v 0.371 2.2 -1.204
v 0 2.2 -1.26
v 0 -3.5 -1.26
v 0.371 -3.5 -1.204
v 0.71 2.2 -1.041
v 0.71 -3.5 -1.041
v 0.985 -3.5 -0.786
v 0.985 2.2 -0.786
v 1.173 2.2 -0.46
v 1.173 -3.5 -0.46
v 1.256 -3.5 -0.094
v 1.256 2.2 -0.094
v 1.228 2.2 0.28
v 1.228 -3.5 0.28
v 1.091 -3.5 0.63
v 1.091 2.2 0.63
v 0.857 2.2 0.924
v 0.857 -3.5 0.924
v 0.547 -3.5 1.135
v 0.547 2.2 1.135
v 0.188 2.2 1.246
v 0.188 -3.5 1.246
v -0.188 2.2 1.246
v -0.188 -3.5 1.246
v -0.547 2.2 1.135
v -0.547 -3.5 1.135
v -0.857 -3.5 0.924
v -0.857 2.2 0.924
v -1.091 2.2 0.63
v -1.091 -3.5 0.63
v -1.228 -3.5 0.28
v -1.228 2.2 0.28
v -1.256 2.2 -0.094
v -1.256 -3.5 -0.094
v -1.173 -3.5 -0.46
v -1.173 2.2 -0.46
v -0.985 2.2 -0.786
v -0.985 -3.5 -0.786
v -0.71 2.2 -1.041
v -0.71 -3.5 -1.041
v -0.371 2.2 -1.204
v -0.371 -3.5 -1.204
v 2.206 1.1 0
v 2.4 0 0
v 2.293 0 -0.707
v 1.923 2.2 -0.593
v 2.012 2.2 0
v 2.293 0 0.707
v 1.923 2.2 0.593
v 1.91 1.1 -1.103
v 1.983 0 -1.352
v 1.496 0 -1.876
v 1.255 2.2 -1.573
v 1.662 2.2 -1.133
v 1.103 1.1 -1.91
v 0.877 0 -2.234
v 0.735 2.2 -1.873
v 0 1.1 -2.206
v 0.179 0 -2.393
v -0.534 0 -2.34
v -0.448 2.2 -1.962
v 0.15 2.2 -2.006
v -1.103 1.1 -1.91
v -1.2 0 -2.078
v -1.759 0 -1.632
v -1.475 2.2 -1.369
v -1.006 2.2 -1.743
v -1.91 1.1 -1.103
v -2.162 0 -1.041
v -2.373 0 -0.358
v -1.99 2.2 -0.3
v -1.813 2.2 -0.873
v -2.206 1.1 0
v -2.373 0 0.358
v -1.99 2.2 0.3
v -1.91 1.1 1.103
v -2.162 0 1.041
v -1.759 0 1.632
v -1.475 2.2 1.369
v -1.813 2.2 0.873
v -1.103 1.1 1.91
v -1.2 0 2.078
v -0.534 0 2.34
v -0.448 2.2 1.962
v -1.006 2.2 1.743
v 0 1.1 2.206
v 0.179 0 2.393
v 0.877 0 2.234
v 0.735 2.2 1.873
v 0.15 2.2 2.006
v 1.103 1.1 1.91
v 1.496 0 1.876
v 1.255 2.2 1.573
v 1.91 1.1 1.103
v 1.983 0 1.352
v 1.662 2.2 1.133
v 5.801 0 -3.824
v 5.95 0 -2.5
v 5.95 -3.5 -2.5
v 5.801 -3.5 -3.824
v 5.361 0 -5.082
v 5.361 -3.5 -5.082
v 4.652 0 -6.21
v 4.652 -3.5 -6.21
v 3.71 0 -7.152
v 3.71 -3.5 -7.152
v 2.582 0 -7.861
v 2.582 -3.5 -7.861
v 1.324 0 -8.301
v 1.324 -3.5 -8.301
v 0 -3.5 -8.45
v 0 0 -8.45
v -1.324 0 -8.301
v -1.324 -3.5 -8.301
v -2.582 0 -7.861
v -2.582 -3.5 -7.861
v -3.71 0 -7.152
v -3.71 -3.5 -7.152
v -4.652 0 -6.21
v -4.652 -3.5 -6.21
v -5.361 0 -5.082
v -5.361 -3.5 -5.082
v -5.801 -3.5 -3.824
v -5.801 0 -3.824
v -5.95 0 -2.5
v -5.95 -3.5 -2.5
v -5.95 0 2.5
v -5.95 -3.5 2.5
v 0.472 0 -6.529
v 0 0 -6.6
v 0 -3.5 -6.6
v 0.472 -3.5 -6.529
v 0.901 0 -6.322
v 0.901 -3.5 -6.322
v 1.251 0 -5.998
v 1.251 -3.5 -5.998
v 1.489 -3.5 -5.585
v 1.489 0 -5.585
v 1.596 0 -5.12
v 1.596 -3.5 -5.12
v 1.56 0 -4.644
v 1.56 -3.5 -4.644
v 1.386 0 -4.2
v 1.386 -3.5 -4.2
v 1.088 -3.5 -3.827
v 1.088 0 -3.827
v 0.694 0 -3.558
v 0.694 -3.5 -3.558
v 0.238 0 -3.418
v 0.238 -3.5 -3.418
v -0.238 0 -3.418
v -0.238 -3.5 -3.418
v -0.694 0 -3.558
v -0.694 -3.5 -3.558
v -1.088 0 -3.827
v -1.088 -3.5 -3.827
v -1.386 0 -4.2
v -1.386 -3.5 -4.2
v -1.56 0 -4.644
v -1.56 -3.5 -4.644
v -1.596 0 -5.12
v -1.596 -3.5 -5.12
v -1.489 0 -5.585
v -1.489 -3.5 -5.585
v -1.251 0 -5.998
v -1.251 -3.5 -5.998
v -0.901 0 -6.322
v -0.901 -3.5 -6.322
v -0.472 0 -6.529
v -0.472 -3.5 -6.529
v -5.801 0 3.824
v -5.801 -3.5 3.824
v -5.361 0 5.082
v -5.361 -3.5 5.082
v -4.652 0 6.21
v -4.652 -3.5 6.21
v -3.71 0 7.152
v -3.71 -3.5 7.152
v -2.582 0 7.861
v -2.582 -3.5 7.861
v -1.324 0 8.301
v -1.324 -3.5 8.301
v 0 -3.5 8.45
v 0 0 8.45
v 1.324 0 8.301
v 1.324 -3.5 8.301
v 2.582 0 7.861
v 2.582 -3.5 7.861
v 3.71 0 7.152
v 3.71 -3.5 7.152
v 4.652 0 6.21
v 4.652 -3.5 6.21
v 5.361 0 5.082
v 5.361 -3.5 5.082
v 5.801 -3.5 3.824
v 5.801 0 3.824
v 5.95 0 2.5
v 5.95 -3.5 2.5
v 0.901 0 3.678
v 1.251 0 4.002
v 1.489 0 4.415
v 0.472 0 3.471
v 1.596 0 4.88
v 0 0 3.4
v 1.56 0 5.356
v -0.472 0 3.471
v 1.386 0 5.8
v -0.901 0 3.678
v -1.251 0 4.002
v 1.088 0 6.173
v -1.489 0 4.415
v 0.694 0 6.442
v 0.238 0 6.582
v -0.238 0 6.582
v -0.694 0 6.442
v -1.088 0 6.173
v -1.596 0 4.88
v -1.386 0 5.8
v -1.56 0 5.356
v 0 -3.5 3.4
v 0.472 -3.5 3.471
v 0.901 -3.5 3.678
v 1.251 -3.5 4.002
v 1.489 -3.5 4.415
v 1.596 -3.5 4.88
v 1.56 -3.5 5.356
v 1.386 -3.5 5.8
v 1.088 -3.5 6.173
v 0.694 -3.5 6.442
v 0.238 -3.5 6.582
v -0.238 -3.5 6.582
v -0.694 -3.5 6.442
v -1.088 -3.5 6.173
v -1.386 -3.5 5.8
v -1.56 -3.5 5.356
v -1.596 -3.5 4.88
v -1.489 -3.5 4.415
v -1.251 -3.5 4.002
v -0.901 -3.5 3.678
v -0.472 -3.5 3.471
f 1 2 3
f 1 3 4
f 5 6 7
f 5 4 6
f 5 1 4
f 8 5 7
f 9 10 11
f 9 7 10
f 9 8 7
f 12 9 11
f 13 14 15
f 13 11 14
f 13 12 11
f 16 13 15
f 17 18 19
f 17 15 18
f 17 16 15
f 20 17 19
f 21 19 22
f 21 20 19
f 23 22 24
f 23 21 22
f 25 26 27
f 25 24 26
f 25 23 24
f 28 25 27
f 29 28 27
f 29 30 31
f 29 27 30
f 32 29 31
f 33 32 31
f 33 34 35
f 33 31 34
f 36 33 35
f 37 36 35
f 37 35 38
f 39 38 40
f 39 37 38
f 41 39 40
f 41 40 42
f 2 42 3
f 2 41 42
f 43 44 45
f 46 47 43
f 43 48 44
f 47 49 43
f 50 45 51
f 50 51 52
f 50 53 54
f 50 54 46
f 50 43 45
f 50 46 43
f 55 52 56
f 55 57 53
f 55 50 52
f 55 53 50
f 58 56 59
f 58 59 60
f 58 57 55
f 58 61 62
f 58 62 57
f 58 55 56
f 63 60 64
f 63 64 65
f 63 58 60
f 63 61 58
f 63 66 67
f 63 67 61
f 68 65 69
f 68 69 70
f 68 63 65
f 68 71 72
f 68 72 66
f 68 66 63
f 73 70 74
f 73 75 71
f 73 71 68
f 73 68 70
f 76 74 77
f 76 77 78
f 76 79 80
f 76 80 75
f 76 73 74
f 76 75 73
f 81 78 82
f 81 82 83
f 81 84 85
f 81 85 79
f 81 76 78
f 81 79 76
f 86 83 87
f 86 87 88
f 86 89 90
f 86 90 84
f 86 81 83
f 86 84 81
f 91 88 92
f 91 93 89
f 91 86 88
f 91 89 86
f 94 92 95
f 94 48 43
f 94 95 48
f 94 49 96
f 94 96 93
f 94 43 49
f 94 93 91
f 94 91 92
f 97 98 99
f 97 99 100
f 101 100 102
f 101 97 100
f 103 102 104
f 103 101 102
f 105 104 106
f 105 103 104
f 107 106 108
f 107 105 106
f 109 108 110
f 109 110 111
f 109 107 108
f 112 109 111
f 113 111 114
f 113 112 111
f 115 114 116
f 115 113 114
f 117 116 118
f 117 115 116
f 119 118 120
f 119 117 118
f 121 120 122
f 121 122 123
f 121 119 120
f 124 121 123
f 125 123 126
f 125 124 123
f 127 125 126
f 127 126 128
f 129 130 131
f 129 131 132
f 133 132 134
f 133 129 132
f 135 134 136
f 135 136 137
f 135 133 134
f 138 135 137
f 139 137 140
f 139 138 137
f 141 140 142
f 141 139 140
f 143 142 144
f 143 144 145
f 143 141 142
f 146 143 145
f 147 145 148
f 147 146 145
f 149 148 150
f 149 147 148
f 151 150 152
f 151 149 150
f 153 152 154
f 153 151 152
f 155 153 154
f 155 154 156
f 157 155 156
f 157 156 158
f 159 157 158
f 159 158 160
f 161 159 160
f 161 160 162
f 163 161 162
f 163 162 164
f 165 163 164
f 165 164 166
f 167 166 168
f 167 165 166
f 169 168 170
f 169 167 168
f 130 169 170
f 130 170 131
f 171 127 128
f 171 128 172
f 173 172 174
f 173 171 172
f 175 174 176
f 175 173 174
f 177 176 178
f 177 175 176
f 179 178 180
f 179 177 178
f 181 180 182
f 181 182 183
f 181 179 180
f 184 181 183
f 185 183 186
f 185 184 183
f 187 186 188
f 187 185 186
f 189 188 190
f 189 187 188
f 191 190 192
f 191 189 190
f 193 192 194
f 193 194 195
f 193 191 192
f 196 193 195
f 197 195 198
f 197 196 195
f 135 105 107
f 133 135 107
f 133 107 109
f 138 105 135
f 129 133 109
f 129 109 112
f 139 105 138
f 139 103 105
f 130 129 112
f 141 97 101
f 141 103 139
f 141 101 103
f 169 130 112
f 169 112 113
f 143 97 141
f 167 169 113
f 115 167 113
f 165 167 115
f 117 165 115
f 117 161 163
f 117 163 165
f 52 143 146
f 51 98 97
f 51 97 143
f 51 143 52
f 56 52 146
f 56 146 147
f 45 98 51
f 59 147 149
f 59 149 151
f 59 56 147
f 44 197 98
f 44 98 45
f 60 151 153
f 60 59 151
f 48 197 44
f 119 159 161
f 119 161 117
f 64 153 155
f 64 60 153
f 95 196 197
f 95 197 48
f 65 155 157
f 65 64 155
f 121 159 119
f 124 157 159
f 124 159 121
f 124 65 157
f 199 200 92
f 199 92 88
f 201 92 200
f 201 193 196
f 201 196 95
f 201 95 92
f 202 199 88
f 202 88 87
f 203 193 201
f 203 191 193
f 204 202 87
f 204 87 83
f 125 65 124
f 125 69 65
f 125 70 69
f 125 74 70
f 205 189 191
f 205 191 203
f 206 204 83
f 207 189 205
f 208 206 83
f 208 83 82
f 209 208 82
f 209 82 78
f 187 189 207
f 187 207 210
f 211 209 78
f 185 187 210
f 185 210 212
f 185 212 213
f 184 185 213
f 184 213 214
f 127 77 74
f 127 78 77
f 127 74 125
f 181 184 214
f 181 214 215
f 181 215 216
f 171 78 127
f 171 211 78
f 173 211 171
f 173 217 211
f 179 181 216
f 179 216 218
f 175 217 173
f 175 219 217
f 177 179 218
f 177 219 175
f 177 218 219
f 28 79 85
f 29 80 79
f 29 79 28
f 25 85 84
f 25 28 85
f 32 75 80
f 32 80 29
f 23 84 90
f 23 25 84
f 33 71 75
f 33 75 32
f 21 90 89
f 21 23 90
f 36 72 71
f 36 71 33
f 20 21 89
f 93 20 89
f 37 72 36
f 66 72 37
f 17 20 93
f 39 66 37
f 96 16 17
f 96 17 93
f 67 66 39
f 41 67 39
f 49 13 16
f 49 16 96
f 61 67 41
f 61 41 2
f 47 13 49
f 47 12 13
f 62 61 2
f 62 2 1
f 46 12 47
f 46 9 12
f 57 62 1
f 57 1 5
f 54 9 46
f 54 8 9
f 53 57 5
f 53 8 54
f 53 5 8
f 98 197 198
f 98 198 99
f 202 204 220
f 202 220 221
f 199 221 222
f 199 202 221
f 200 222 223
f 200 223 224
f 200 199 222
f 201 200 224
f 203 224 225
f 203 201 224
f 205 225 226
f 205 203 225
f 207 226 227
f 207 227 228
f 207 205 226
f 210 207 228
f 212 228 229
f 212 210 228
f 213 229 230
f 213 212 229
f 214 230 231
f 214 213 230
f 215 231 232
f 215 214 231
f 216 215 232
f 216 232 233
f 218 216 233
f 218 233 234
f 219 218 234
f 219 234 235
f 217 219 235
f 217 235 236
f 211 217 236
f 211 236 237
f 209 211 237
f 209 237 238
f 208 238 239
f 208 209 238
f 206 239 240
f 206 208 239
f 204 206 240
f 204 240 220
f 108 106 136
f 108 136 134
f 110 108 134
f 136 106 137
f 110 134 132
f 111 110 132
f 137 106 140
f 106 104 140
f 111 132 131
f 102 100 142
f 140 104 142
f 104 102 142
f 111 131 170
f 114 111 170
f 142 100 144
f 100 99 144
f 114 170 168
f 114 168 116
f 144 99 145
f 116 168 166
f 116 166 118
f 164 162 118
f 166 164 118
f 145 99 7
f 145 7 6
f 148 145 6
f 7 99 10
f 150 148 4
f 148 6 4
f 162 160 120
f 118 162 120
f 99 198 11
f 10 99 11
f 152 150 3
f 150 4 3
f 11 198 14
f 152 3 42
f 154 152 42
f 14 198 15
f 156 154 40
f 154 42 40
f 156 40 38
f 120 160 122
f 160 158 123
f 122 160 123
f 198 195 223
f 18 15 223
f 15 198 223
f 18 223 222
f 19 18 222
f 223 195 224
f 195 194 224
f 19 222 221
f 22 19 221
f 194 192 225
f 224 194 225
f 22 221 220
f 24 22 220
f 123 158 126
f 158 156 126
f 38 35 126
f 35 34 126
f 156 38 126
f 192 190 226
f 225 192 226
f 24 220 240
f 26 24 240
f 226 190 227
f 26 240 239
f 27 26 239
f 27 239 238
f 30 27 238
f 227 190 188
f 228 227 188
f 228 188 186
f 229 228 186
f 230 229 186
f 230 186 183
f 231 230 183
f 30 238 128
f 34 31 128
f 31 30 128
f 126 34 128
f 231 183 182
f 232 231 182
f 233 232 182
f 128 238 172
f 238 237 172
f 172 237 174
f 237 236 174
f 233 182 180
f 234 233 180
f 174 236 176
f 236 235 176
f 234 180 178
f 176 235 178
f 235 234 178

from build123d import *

# Parameters (mm, degrees)
SKETCH1_R               = 2.4
BOSS_EXTRUDE1_DEPTH     = 2.2
BOSS_EXTRUDE1_TAPER     = 10
SKETCH2_R               = 1.6
BOSS_EXTRUDE2_DEPTH     = 3.5
CUT_EXTRUDE1_DEPTH      = 12.802330327
CUT_EXTRUDE1_DEPTH_BACK = 12.802330327
SKETCH4_R               = 1.26


with BuildPart() as part:
    # Sketch1 → Boss-Extrude1 (new body)
    with BuildSketch(Plane(origin=(0, 0, 0), x_dir=(1, 0, 0), z_dir=(0, 1, 0))):
        Circle(SKETCH1_R)
    extrude(amount=BOSS_EXTRUDE1_DEPTH, taper=BOSS_EXTRUDE1_TAPER)

    # Sketch2 → Boss-Extrude2 (add)
    with BuildSketch(Plane.XZ):
        with BuildLine():
            Line((-5.95, -2.5), (-5.95, 2.5))
            ThreePointArc((-5.95, 2.5), (0, 8.45), (5.95, 2.5))
            Line((5.95, 2.5), (5.95, -2.5))
            ThreePointArc((5.95, -2.5), (0, -8.45), (-5.95, -2.5))
        make_face()
        with Locations(Location((0, -5, 0), (0, 0, 270))):
            Circle(SKETCH2_R, mode=Mode.SUBTRACT)
        with Locations(Location((0, 5, 0), (0, 0, 270))):
            Circle(SKETCH2_R, mode=Mode.SUBTRACT)
    extrude(amount=BOSS_EXTRUDE2_DEPTH)

    # Sketch4 → Cut-Extrude1 (cut, two sides: drawn at the far end of the back side and taken through both)
    with BuildSketch(Plane.XZ.offset(3.5).offset(-CUT_EXTRUDE1_DEPTH_BACK)):
        with Locations(Location((0, 0, 0), (0, 0, 270))):
            Circle(SKETCH4_R)
    extrude(amount=CUT_EXTRUDE1_DEPTH + CUT_EXTRUDE1_DEPTH_BACK, mode=Mode.SUBTRACT)


solid = part.part
